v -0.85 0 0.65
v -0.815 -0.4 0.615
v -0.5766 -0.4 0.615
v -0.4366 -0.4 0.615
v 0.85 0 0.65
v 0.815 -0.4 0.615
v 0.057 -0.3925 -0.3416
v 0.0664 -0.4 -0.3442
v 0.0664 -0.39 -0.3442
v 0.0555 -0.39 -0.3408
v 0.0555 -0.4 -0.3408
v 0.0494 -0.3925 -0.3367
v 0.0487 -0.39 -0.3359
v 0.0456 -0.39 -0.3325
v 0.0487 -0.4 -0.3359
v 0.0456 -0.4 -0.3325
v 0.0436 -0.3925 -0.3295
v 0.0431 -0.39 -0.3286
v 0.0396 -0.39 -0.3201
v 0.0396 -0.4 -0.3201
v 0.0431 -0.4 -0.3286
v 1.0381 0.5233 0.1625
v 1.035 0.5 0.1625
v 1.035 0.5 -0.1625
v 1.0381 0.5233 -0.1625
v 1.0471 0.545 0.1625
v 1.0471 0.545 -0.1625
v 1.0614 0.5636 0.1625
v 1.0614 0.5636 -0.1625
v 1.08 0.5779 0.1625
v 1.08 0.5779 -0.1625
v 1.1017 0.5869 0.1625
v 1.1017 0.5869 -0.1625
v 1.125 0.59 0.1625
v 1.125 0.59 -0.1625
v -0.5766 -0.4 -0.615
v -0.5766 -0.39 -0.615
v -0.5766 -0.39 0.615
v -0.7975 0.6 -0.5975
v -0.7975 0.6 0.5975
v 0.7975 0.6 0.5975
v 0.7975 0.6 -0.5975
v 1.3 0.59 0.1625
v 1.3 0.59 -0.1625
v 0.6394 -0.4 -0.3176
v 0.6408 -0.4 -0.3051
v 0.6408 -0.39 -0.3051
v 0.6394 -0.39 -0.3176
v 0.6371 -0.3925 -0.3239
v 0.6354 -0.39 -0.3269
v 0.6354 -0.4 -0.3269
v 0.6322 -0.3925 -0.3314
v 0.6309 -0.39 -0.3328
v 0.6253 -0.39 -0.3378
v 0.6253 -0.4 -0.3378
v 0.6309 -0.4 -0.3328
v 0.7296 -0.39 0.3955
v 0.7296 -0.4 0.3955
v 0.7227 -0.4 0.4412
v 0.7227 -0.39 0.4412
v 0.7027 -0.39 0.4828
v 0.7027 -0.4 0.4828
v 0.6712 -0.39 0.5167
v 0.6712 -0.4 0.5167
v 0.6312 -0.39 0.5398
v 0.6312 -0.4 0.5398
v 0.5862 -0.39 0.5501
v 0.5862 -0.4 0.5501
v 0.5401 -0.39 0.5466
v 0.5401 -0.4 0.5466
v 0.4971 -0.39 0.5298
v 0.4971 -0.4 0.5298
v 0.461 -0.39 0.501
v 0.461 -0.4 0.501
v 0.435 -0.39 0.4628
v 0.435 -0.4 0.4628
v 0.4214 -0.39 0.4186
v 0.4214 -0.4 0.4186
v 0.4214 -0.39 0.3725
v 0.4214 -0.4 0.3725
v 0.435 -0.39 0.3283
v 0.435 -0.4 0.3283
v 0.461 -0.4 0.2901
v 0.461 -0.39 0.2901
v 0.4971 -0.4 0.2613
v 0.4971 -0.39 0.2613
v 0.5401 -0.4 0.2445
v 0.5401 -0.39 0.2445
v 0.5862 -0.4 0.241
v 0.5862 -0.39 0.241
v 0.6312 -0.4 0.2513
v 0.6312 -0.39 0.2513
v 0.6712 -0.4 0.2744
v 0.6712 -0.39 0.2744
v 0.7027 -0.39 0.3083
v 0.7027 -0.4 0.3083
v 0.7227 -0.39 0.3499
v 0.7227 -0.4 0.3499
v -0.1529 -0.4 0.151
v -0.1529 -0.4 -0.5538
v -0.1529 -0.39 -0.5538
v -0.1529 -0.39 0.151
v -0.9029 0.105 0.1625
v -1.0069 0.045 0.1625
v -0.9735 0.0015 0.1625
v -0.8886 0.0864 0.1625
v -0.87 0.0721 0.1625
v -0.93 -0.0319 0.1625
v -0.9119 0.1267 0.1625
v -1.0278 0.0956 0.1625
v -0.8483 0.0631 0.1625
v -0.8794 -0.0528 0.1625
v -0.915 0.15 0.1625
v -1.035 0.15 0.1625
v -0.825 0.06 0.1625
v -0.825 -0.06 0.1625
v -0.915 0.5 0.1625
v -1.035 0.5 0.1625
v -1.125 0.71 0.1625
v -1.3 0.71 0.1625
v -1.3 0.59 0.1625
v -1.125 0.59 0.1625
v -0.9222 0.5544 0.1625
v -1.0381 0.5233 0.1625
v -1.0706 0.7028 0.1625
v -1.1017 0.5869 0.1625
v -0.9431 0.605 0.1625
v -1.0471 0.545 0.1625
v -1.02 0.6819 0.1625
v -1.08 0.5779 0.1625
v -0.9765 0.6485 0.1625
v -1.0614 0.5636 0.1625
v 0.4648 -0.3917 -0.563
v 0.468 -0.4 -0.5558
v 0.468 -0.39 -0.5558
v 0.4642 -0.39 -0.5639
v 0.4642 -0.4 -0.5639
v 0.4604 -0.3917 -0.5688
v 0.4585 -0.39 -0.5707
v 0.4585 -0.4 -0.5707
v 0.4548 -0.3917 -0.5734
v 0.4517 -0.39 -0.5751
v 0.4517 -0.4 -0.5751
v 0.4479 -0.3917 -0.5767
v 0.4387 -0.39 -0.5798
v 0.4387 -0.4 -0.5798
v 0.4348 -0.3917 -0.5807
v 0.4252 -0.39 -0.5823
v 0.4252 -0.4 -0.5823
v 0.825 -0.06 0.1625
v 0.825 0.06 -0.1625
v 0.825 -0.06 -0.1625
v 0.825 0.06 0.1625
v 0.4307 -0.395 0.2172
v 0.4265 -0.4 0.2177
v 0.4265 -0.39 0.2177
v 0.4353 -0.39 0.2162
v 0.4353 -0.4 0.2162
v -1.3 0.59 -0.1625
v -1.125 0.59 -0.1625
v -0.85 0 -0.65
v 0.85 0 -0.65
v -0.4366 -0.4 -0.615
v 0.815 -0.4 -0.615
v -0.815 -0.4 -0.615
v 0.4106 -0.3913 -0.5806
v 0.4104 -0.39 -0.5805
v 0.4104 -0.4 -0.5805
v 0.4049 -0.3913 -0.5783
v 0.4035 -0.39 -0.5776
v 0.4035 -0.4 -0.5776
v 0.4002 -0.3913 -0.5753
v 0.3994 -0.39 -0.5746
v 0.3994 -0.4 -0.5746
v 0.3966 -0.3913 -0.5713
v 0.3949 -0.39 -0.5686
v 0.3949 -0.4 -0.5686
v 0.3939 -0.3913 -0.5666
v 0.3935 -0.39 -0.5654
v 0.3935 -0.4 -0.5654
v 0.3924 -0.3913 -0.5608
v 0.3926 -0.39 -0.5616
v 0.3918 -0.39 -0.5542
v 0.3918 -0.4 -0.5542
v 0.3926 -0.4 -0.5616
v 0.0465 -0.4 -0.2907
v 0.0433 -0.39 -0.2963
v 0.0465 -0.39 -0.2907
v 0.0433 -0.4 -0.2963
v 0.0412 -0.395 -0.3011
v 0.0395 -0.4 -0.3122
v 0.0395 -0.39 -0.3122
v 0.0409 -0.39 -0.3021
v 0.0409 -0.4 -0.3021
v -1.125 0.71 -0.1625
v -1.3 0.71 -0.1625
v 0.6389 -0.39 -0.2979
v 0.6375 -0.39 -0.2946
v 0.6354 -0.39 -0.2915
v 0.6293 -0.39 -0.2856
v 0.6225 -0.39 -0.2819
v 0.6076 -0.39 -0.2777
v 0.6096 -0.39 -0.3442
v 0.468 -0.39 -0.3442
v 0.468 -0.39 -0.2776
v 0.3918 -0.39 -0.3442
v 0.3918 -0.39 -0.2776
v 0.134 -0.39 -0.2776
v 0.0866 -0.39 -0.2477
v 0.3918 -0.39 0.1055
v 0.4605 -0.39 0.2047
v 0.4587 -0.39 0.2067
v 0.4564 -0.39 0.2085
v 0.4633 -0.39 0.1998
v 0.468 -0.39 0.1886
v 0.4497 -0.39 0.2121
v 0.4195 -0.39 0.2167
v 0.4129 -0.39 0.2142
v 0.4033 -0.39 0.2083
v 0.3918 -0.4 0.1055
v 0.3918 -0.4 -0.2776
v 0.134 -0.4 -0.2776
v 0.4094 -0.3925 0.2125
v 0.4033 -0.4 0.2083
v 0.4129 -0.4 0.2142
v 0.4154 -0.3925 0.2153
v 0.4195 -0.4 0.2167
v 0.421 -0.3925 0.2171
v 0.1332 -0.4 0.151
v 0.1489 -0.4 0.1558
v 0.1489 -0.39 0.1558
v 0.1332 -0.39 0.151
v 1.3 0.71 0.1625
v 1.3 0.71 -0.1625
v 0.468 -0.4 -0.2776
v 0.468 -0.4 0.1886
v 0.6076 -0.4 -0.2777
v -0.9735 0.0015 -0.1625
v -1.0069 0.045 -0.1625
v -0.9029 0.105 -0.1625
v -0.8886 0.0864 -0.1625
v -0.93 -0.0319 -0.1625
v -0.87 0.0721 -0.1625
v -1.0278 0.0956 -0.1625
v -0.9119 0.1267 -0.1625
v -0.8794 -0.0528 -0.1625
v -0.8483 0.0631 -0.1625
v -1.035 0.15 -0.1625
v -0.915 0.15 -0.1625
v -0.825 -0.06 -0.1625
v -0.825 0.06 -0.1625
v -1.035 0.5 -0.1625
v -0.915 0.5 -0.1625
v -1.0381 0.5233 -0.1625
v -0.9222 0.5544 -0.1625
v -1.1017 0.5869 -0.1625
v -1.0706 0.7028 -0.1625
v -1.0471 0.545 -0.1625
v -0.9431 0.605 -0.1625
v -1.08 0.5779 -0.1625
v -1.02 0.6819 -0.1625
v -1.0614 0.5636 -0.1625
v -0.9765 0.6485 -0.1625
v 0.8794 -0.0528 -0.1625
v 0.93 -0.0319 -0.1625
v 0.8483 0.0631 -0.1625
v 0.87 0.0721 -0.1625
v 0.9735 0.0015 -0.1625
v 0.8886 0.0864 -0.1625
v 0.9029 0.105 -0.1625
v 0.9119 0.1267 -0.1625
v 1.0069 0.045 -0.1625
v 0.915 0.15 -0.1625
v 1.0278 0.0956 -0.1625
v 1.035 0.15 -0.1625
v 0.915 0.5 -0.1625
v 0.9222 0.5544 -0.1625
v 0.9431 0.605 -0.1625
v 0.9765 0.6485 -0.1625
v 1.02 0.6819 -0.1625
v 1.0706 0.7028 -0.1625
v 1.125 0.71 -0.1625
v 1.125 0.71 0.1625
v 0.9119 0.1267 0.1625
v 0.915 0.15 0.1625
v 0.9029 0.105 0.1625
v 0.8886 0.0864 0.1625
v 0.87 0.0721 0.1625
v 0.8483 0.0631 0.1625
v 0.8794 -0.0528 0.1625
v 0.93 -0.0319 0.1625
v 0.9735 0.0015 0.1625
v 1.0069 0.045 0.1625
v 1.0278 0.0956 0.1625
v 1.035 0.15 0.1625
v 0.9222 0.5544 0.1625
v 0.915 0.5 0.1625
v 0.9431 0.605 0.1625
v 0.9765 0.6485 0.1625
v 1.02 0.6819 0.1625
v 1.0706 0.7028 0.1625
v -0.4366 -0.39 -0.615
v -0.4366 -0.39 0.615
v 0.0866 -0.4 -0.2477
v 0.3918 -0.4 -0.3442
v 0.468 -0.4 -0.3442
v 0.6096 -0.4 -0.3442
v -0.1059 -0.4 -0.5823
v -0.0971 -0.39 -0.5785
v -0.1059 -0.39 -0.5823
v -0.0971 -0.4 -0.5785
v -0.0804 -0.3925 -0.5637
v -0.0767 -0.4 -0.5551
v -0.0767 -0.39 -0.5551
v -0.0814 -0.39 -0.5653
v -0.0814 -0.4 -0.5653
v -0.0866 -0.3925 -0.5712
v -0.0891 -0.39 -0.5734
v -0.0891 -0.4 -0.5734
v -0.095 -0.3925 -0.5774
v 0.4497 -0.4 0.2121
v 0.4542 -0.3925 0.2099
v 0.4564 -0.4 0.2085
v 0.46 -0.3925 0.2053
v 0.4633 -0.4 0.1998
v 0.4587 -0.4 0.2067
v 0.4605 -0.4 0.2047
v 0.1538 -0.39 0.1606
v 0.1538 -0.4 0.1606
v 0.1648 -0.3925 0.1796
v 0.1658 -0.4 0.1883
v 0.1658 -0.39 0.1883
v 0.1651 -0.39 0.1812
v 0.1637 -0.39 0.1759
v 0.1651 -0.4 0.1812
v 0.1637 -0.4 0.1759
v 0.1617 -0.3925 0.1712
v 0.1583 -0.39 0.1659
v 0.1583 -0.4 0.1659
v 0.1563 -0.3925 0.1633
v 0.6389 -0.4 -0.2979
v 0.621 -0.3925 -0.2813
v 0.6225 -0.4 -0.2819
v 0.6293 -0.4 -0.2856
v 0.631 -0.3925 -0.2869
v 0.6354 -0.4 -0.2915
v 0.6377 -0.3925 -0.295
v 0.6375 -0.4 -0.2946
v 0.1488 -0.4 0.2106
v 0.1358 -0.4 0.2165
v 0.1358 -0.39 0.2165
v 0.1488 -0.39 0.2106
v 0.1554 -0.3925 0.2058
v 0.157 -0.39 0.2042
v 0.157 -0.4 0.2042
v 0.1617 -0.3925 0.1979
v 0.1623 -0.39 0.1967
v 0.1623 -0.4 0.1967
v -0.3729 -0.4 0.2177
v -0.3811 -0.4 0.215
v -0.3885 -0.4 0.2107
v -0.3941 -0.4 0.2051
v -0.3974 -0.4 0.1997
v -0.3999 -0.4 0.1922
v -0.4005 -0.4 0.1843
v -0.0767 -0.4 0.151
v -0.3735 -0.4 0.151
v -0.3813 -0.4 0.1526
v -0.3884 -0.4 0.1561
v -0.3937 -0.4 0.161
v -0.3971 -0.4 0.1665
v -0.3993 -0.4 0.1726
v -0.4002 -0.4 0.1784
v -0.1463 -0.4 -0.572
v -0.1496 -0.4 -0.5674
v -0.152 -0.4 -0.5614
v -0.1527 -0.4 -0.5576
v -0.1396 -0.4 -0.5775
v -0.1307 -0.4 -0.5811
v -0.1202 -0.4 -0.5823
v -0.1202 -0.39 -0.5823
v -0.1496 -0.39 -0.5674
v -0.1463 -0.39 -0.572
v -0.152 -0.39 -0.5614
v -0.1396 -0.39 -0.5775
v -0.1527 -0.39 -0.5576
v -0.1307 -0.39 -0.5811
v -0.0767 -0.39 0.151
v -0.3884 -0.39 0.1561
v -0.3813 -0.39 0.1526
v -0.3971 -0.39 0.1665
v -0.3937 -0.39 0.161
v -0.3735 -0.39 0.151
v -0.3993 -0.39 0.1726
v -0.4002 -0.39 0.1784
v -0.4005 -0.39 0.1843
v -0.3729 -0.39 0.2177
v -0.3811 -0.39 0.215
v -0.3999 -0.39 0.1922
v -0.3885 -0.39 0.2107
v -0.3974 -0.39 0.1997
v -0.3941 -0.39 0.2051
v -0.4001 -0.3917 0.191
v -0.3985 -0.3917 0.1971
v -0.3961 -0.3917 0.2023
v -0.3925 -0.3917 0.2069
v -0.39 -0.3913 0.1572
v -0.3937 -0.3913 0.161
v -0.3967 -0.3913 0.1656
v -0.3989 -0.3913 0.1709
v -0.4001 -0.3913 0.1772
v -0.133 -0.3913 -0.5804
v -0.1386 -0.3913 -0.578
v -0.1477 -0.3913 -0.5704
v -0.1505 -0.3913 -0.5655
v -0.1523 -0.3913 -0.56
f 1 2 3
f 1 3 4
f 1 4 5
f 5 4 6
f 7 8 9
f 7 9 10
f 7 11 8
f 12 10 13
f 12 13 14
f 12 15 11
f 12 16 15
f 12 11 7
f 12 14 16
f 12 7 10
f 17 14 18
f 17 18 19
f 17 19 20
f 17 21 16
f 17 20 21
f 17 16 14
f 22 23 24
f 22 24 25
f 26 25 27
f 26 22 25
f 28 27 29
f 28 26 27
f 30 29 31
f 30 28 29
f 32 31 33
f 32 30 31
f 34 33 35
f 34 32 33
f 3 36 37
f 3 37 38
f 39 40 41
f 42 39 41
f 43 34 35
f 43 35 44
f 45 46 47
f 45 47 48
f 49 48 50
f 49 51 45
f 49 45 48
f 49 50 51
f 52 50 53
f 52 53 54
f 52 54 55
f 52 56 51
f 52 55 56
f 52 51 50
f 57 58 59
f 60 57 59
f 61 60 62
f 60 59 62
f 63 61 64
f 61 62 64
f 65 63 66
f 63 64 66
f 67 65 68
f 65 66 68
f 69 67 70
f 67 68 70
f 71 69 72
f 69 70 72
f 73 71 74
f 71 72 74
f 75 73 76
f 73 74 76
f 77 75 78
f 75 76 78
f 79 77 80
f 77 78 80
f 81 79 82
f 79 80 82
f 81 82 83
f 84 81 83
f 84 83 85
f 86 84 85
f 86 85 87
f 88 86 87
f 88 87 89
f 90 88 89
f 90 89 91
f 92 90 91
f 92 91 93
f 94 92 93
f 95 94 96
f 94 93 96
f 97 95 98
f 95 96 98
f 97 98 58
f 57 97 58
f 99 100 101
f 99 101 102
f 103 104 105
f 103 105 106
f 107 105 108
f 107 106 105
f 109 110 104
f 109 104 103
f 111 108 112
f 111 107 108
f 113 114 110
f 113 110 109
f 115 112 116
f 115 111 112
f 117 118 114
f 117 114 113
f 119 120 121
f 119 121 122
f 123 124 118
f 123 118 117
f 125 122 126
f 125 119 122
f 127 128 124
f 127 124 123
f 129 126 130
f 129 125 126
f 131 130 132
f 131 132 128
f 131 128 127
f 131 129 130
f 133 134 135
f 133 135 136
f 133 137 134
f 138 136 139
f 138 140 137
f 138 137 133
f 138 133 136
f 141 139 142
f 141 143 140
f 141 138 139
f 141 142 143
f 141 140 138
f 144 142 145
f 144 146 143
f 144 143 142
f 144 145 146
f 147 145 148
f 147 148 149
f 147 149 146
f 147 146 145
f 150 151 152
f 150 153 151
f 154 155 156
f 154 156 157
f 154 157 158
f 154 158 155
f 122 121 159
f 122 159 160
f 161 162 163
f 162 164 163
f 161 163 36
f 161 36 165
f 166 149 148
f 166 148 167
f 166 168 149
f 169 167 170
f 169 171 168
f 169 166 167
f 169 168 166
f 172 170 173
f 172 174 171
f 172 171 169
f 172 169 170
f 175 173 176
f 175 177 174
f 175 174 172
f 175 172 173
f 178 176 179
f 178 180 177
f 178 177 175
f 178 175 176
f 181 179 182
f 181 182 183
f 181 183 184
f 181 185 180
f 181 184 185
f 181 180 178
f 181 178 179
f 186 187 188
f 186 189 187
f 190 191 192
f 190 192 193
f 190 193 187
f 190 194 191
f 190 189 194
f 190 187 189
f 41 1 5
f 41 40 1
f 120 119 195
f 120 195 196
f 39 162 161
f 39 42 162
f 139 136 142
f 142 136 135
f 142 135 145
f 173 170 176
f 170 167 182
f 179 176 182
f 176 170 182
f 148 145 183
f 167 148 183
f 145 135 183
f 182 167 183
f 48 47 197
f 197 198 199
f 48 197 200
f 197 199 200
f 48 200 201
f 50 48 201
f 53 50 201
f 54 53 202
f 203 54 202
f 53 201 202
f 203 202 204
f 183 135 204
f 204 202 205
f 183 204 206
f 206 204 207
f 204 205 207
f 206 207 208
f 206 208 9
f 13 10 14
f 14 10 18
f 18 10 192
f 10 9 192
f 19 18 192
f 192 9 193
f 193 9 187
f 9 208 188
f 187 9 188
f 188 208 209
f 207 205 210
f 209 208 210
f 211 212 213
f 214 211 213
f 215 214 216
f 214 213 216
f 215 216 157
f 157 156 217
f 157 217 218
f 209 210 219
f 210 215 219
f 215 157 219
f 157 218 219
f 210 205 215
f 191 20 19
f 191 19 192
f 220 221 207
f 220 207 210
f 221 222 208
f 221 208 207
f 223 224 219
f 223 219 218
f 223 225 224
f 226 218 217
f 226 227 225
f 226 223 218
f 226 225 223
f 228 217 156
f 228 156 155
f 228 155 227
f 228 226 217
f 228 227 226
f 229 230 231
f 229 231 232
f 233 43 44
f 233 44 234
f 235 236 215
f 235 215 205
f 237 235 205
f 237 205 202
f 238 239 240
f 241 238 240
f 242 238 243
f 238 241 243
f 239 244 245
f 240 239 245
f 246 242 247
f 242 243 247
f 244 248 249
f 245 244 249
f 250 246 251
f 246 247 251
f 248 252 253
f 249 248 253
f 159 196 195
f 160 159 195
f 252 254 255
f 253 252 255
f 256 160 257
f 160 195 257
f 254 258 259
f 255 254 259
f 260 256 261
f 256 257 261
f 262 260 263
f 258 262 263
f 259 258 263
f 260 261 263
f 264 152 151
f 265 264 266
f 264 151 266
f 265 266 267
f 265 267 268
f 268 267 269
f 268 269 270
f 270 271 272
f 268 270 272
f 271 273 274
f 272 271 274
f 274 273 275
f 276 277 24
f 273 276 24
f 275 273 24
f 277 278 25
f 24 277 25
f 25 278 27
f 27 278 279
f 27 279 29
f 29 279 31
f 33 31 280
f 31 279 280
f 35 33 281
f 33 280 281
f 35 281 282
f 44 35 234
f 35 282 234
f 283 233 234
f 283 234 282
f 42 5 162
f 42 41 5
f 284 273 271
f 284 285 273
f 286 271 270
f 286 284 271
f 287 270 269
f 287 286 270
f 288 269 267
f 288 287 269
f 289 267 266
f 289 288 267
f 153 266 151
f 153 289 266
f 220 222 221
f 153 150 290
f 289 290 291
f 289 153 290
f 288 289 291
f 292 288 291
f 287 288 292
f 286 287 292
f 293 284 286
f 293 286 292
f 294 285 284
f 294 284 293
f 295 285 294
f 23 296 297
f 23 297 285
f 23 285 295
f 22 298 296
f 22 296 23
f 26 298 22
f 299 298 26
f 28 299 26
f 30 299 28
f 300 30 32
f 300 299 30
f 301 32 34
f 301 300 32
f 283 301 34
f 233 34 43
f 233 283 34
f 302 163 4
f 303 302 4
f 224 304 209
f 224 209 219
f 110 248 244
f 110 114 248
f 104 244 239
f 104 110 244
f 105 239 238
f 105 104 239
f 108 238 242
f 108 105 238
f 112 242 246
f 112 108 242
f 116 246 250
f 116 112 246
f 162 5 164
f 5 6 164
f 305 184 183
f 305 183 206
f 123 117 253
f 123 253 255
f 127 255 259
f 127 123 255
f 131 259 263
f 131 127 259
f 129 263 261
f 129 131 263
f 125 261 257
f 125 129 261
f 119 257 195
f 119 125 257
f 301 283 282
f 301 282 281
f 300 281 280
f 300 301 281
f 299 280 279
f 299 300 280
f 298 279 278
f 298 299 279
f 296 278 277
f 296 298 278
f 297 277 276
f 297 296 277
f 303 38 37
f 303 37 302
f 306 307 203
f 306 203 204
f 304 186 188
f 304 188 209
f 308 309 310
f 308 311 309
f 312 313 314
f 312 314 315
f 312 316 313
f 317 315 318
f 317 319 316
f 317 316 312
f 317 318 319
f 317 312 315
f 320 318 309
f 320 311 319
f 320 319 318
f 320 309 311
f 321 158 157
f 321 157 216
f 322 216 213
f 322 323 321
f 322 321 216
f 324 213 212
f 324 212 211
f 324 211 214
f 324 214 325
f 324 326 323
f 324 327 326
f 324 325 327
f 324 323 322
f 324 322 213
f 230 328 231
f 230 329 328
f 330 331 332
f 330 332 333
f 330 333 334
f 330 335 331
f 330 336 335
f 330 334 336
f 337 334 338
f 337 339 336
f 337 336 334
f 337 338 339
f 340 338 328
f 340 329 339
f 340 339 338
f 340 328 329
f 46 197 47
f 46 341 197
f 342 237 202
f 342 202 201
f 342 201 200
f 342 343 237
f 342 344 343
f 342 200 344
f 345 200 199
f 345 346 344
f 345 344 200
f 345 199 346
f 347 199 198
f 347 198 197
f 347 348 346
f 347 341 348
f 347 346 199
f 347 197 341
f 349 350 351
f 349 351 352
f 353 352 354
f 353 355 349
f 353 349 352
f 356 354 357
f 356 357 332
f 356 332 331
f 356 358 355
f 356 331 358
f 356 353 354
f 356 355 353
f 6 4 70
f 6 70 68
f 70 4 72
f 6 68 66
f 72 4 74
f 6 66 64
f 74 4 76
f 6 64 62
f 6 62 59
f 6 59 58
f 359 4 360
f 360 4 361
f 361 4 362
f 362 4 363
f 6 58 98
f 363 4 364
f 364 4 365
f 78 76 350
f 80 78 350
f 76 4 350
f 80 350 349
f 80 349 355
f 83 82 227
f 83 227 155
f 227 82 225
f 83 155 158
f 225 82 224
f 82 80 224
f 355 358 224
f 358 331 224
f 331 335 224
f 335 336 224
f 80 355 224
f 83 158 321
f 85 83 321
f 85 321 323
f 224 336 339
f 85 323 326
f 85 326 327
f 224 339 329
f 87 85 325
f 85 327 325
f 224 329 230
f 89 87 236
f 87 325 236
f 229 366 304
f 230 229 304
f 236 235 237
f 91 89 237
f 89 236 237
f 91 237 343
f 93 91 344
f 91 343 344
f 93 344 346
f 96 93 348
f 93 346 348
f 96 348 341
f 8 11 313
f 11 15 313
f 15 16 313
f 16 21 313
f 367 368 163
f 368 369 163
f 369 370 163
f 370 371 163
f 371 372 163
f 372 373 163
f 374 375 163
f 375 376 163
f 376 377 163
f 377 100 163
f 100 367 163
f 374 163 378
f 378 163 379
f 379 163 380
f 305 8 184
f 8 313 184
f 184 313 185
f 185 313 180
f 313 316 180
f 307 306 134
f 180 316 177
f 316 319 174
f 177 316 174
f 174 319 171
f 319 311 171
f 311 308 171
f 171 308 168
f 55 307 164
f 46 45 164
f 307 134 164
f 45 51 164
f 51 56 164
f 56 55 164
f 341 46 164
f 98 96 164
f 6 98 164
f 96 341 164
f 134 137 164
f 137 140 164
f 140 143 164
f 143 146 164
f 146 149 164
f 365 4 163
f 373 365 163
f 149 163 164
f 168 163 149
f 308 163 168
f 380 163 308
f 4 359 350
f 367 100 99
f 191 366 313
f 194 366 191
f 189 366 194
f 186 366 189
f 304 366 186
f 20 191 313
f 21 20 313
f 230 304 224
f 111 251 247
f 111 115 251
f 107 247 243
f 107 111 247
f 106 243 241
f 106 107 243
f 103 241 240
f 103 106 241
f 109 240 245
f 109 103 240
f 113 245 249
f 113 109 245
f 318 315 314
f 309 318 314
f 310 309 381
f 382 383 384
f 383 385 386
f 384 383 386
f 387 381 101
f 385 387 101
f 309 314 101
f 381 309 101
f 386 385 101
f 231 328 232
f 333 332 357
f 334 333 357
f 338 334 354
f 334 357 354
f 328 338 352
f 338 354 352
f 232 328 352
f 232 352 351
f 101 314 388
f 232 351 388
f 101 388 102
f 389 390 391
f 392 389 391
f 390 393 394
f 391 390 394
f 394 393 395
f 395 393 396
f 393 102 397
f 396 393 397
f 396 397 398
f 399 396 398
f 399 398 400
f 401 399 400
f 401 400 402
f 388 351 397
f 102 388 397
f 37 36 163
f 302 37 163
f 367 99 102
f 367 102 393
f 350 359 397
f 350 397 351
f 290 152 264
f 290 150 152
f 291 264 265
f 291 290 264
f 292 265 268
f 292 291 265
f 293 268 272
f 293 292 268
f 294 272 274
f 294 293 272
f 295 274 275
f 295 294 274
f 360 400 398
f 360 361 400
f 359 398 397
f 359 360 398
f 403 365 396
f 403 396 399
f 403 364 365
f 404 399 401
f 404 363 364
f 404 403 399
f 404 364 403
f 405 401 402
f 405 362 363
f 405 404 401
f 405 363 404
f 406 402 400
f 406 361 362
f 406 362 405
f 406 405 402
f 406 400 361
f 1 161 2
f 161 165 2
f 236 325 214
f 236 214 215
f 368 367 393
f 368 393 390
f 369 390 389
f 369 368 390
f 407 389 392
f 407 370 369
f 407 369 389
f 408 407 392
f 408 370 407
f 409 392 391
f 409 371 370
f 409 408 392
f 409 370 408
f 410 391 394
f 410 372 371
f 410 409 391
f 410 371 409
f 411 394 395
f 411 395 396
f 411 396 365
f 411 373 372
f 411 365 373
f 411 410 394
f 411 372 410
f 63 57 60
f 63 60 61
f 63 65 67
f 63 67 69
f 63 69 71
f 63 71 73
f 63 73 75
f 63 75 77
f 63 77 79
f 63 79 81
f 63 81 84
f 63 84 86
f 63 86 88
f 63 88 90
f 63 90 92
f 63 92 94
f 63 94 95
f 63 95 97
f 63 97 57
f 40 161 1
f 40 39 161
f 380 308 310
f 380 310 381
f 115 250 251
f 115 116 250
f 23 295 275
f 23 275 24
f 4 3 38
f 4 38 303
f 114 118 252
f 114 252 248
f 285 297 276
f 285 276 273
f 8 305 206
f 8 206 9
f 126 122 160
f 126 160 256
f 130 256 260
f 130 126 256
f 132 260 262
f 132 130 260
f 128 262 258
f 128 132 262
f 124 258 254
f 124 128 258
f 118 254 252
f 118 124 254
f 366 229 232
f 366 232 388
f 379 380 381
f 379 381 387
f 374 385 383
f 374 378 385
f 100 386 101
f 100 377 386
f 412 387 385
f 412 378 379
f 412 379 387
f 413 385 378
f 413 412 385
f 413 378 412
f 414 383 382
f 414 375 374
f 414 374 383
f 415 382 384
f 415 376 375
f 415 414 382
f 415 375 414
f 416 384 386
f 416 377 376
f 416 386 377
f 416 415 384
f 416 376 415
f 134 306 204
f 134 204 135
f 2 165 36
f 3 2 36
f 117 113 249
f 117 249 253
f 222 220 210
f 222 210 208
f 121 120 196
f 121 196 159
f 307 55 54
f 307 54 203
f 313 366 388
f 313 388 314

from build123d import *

# Parameters (mm, degrees)
SKETCH2_W                     = 1.7
SKETCH2_H                     = 1.3
BOSS_EXTRUDE1_DEPTH           = 0.6
BOSS_EXTRUDE1_TAPER           = 5
BOSS_EXTRUDE1_OTHER_WAY_DEPTH = 0.4
BOSS_EXTRUDE1_OTHER_WAY_TAPER = 5
EXTRUDE_THIN6_DEPTH           = 0.1625
EXTRUDE_THIN6_2_DEPTH         = 0.1625
SKETCH5_R                     = 0.154965455
SKETCH5_R_2                   = 0.014965455
SKETCH5_W                     = 0.14
SKETCH5_H                     = 1.23000907
CUT_EXTRUDE_THIN1_DEPTH       = 0.01
CUT_EXTRUDE1_START            = 0.01
SKETCH6_R                     = 0.154965455
CUT_EXTRUDE1_DEPTH            = 0.01
CUT_EXTRUDE2_DEPTH            = 0.01


with BuildPart() as part:
    # Sketch2 → Boss-Extrude1 (new body)
    with BuildSketch(Plane(origin=(0, 0, 0), x_dir=(1, 0, 0), z_dir=(0, 1, 0))):
        Rectangle(SKETCH2_W, SKETCH2_H)
    extrude(amount=BOSS_EXTRUDE1_DEPTH, taper=BOSS_EXTRUDE1_TAPER)

    # Sketch2 → Boss-Extrude1 other way (add)
    with BuildSketch(Plane(origin=(0, 0, 0), x_dir=(1, 0, 0), z_dir=(0, 1, 0))):
        Rectangle(SKETCH2_W, SKETCH2_H)
    extrude(amount=-BOSS_EXTRUDE1_OTHER_WAY_DEPTH, taper=BOSS_EXTRUDE1_OTHER_WAY_TAPER)

    # Sketch5 → Cut-Extrude-Thin1 (cut)
    # profile 1 of 2: a face of its own
    with BuildSketch(Plane.XZ.offset(0.4)):
        with Locations((0.574621923, 0.395548424)):
            Circle(SKETCH5_R)
        with Locations((0.574621923, 0.395548424)):
            Circle(SKETCH5_R_2, mode=Mode.SUBTRACT)
    # profile 2 of 2: a face of its own
    with BuildSketch(Plane.XZ.offset(0.4)):
        with Locations((-0.506619328, 0)):
            Rectangle(SKETCH5_W, SKETCH5_H)
    extrude(amount=-CUT_EXTRUDE_THIN1_DEPTH, mode=Mode.SUBTRACT)

    # Sketch6 → Cut-Extrude1 (cut)
    with BuildSketch(Plane.XZ.offset(0.39).offset(CUT_EXTRUDE1_START)):
        with Locations((0.574621923, 0.395548424)):
            Circle(SKETCH6_R)
    extrude(amount=-CUT_EXTRUDE1_DEPTH, mode=Mode.SUBTRACT)

    # Sketch7 → Cut-Extrude2 (cut)
    # profile 1 of 2: a face of its own
    with BuildSketch(Plane.XZ.offset(0.4)):
        with BuildLine():
            add(Edge.make_bspline(
                [(0.135770796, 0.216473748), (0.139457272, 0.215079931), (0.146483353, 0.212423445), (0.155620509, 0.206309111), (0.162195426, 0.198017774), (0.16460564, 0.191606468), (0.16583032, 0.188348748)],
                knots=[0, 0, 0, 0, 1.099088096, 2.094759837, 3.031906972, 4, 4, 4, 4], degree=3))
            add(Edge.make_bspline(
                [(0.16583032, 0.188348748), (0.165630292, 0.185394271), (0.165228908, 0.179465714), (0.161878213, 0.170869074), (0.156329822, 0.162836578), (0.151442353, 0.15820231), (0.148866035, 0.155759462)],
                knots=[0, 0, 0, 0, 0.933029919, 1.872250689, 2.878405478, 4, 4, 4, 4], degree=3))
            Line((0.148866035, 0.155759462), (0.133241035, 0.150997557))
            Line((0.133241035, 0.150997557), (-0.076729204, 0.150997557))
            Line((-0.076729204, 0.150997557), (-0.076729204, -0.555103633))
            add(Edge.make_bspline(
                [(-0.076729204, -0.555103633), (-0.077802922, -0.558071681), (-0.079975895, -0.564078366), (-0.086528911, -0.571673619), (-0.095208321, -0.578075398), (-0.102189792, -0.580858422), (-0.10589587, -0.582335776)],
                knots=[0, 0, 0, 0, 0.906362302, 1.834280943, 2.850339336, 4, 4, 4, 4], degree=3))
            Line((-0.10589587, -0.582335776), (-0.120181584, -0.582335776))
            add(Edge.make_bspline(
                [(-0.120181584, -0.582335776), (-0.122425391, -0.582274188), (-0.126768823, -0.582154969), (-0.132970545, -0.580535899), (-0.138715826, -0.578269093), (-0.143594023, -0.574713989), (-0.147911363, -0.57068195), (-0.150703778, -0.565546173), (-0.152638167, -0.559904422), (-0.152823336, -0.555865706), (-0.15291968, -0.553764347)],
                knots=[0, 0, 0, 0, 1.101604685, 2.132423317, 3.139528337, 4.122044172, 5.089259853, 6.019369827, 6.969470802, 8, 8, 8, 8], degree=3))
            Line((-0.15291968, -0.553764347), (-0.15291968, 0.150997557))
            Line((-0.15291968, 0.150997557), (-0.373455394, 0.150997557))
            add(Edge.make_bspline(
                [(-0.373455394, 0.150997557), (-0.375605965, 0.151315713), (-0.379701686, 0.151921636), (-0.385334498, 0.154031045), (-0.390031559, 0.157050159), (-0.393904776, 0.160900493), (-0.396844862, 0.165606462), (-0.399190144, 0.171046313), (-0.400262586, 0.177445676), (-0.400443144, 0.181947636), (-0.400538727, 0.184330891)],
                knots=[0, 0, 0, 0, 1.08569211, 2.067680532, 2.983433341, 3.861048676, 4.776801484, 5.744887181, 6.80618505, 8, 8, 8, 8], degree=3))
            add(Edge.make_bspline(
                [(-0.400538727, 0.184330891), (-0.40048955, 0.186577458), (-0.400394084, 0.190938592), (-0.398635178, 0.196981969), (-0.396287133, 0.202507185), (-0.39142343, 0.208508397), (-0.383825939, 0.214605167), (-0.376487568, 0.216652307), (-0.372860156, 0.217664224)],
                knots=[0, 0, 0, 0, 0.852234277, 1.654394119, 2.381606146, 3.12243938, 4.577599788, 6, 6, 6, 6], degree=3))
            Line((-0.372860156, 0.217664224), (0.135770796, 0.216473748))
        make_face()
    # profile 2 of 2: a face of its own
    with BuildSketch(Plane.XZ.offset(0.4)):
        with BuildLine():
            Line((0.463270796, 0.199807081), (0.468032701, 0.188646367))
            Line((0.468032701, 0.188646367), (0.468032701, -0.277573871))
            Line((0.468032701, -0.277573871), (0.607616035, -0.277722681))
            add(Edge.make_bspline(
                [(0.607616035, -0.277722681), (0.612156432, -0.278680776), (0.620451495, -0.280431165), (0.631096055, -0.28619262), (0.638516347, -0.294654989), (0.640036016, -0.301606394), (0.640800558, -0.305103633)],
                knots=[0, 0, 0, 0, 1.195577152, 2.184255469, 3.086502086, 4, 4, 4, 4], degree=3))
            add(Edge.make_bspline(
                [(0.640800558, -0.305103633), (0.640657056, -0.308449604), (0.640381324, -0.314878704), (0.637466795, -0.323962047), (0.632438379, -0.331845491), (0.627723941, -0.335819183), (0.625324368, -0.337841728)],
                knots=[0, 0, 0, 0, 1.063672196, 2.043787557, 3.004319249, 4, 4, 4, 4], degree=3))
            Line((0.625324368, -0.337841728), (0.609550558, -0.344240538))
            Line((0.609550558, -0.344240538), (0.468032701, -0.344240538))
            Line((0.468032701, -0.344240538), (0.468032701, -0.555847681))
            add(Edge.make_bspline(
                [(0.468032701, -0.555847681), (0.46704396, -0.558282303), (0.465145145, -0.562957839), (0.46064499, -0.569013593), (0.45487957, -0.573756805), (0.446098316, -0.577590564), (0.436177698, -0.580726058), (0.428415022, -0.581861812), (0.425175558, -0.582335776)],
                knots=[0, 0, 0, 0, 0.881479644, 1.692825178, 2.511522639, 3.362763725, 4.899447501, 6, 6, 6, 6], degree=3))
            add(Edge.make_bspline(
                [(0.425175558, -0.582335776), (0.422592141, -0.582254923), (0.41768393, -0.582101311), (0.410811436, -0.5808446), (0.405028301, -0.57851237), (0.400026105, -0.575642604), (0.396464478, -0.571381888), (0.393583064, -0.566513999), (0.39224088, -0.560575141), (0.39197916, -0.556396882), (0.391842225, -0.554210776)],
                knots=[0, 0, 0, 0, 1.244483934, 2.364384402, 3.340480475, 4.242091871, 5.105208837, 5.982430491, 6.944388035, 8, 8, 8, 8], degree=3))
            Line((0.391842225, -0.554210776), (0.391842225, -0.344240538))
            Line((0.391842225, -0.344240538), (0.066395796, -0.344240538))
            add(Edge.make_bspline(
                [(0.066395796, -0.344240538), (0.063197263, -0.343542243), (0.057033327, -0.34219655), (0.049070771, -0.336962296), (0.042975047, -0.329474285), (0.040769489, -0.32335182), (0.039610082, -0.320133395)],
                knots=[0, 0, 0, 0, 1.02115313, 1.96787762, 2.931764676, 4, 4, 4, 4], degree=3))
            Line((0.039610082, -0.320133395), (0.039461273, -0.31224649))
            add(Edge.make_bspline(
                [(0.039461273, -0.31224649), (0.039788172, -0.308439955), (0.040451907, -0.300711194), (0.044434312, -0.294049709), (0.04645532, -0.290669109)],
                knots=[0, 0, 0, 0, 0.985031118, 2, 2, 2, 2], degree=3))
            Line((0.04645532, -0.290669109), (0.086633892, -0.247663157))
            Line((0.086633892, -0.247663157), (0.403300558, 0.208289224))
            add(Edge.make_bspline(
                [(0.403300558, 0.208289224), (0.405288071, 0.209756918), (0.409048303, 0.21253369), (0.415110621, 0.21528326), (0.420831347, 0.217302968), (0.424664013, 0.217546581), (0.426514844, 0.217664224)],
                knots=[0, 0, 0, 0, 1.161393316, 2.197273816, 3.129445936, 4, 4, 4, 4], degree=3))
            add(Edge.make_bspline(
                [(0.426514844, 0.217664224), (0.427909924, 0.217552731), (0.430879433, 0.21731541), (0.433764793, 0.216570878), (0.435294606, 0.216176129)],
                knots=[0, 0, 0, 0, 0.939603003, 2, 2, 2, 2], degree=3))
            add(Edge.make_bspline(
                [(0.435294606, 0.216176129), (0.438905124, 0.215404381), (0.445434978, 0.214008626), (0.45386256, 0.210465298), (0.460230174, 0.205922753), (0.462307765, 0.201744047), (0.463270796, 0.199807081)],
                knots=[0, 0, 0, 0, 1.307248616, 2.364243258, 3.241773542, 4, 4, 4, 4], degree=3))
        make_face()
        Polygon((0.13395532, -0.277573871), (0.391842225, -0.277573871), (0.391842225, 0.105461843), align=None, mode=Mode.SUBTRACT)
    extrude(amount=-CUT_EXTRUDE2_DEPTH, mode=Mode.SUBTRACT)


with BuildPart() as body_2:
    # Sketch4 → Extrude-Thin6 (new, symmetric)
    with BuildSketch(Plane.XY):
        with BuildLine():
            ThreePointArc((-0.825, 0.06), (-0.88863961, 0.08636039), (-0.915, 0.15))
            Line((-0.915, 0.15), (-0.915, 0.5))
            ThreePointArc((-0.915, 0.5), (-0.976507576, 0.648492424), (-1.125, 0.71))
            Line((-1.125, 0.71), (-1.3, 0.71))
            Line((-1.3, 0.71), (-1.3, 0.59))
            Line((-1.3, 0.59), (-1.125, 0.59))
            ThreePointArc((-1.125, 0.59), (-1.06136039, 0.56363961), (-1.035, 0.5))
            Line((-1.035, 0.5), (-1.035, 0.15))
            ThreePointArc((-1.035, 0.15), (-0.973492424, 0.001507576), (-0.825, -0.06))
            Line((-0.825, -0.06), (-0.825, 0.06))
        make_face()
    extrude(amount=EXTRUDE_THIN6_DEPTH, both=True)


with BuildPart() as body_3:
    # Sketch4 → Extrude-Thin6 2 (new, symmetric)
    with BuildSketch(Plane.XY):
        with BuildLine():
            ThreePointArc((0.825, -0.06), (0.973492424, 0.001507576), (1.035, 0.15))
            Line((1.035, 0.15), (1.035, 0.5))
            ThreePointArc((1.035, 0.5), (1.06136039, 0.56363961), (1.125, 0.59))
            Line((1.125, 0.59), (1.3, 0.59))
            Line((1.3, 0.59), (1.3, 0.71))
            Line((1.3, 0.71), (1.125, 0.71))
            ThreePointArc((1.125, 0.71), (0.976507576, 0.648492424), (0.915, 0.5))
            Line((0.915, 0.5), (0.915, 0.15))
            ThreePointArc((0.915, 0.15), (0.88863961, 0.08636039), (0.825, 0.06))
            Line((0.825, 0.06), (0.825, -0.06))
        make_face()
    extrude(amount=EXTRUDE_THIN6_2_DEPTH, both=True)


solid = Compound([part.part, body_2.part, body_3.part])
